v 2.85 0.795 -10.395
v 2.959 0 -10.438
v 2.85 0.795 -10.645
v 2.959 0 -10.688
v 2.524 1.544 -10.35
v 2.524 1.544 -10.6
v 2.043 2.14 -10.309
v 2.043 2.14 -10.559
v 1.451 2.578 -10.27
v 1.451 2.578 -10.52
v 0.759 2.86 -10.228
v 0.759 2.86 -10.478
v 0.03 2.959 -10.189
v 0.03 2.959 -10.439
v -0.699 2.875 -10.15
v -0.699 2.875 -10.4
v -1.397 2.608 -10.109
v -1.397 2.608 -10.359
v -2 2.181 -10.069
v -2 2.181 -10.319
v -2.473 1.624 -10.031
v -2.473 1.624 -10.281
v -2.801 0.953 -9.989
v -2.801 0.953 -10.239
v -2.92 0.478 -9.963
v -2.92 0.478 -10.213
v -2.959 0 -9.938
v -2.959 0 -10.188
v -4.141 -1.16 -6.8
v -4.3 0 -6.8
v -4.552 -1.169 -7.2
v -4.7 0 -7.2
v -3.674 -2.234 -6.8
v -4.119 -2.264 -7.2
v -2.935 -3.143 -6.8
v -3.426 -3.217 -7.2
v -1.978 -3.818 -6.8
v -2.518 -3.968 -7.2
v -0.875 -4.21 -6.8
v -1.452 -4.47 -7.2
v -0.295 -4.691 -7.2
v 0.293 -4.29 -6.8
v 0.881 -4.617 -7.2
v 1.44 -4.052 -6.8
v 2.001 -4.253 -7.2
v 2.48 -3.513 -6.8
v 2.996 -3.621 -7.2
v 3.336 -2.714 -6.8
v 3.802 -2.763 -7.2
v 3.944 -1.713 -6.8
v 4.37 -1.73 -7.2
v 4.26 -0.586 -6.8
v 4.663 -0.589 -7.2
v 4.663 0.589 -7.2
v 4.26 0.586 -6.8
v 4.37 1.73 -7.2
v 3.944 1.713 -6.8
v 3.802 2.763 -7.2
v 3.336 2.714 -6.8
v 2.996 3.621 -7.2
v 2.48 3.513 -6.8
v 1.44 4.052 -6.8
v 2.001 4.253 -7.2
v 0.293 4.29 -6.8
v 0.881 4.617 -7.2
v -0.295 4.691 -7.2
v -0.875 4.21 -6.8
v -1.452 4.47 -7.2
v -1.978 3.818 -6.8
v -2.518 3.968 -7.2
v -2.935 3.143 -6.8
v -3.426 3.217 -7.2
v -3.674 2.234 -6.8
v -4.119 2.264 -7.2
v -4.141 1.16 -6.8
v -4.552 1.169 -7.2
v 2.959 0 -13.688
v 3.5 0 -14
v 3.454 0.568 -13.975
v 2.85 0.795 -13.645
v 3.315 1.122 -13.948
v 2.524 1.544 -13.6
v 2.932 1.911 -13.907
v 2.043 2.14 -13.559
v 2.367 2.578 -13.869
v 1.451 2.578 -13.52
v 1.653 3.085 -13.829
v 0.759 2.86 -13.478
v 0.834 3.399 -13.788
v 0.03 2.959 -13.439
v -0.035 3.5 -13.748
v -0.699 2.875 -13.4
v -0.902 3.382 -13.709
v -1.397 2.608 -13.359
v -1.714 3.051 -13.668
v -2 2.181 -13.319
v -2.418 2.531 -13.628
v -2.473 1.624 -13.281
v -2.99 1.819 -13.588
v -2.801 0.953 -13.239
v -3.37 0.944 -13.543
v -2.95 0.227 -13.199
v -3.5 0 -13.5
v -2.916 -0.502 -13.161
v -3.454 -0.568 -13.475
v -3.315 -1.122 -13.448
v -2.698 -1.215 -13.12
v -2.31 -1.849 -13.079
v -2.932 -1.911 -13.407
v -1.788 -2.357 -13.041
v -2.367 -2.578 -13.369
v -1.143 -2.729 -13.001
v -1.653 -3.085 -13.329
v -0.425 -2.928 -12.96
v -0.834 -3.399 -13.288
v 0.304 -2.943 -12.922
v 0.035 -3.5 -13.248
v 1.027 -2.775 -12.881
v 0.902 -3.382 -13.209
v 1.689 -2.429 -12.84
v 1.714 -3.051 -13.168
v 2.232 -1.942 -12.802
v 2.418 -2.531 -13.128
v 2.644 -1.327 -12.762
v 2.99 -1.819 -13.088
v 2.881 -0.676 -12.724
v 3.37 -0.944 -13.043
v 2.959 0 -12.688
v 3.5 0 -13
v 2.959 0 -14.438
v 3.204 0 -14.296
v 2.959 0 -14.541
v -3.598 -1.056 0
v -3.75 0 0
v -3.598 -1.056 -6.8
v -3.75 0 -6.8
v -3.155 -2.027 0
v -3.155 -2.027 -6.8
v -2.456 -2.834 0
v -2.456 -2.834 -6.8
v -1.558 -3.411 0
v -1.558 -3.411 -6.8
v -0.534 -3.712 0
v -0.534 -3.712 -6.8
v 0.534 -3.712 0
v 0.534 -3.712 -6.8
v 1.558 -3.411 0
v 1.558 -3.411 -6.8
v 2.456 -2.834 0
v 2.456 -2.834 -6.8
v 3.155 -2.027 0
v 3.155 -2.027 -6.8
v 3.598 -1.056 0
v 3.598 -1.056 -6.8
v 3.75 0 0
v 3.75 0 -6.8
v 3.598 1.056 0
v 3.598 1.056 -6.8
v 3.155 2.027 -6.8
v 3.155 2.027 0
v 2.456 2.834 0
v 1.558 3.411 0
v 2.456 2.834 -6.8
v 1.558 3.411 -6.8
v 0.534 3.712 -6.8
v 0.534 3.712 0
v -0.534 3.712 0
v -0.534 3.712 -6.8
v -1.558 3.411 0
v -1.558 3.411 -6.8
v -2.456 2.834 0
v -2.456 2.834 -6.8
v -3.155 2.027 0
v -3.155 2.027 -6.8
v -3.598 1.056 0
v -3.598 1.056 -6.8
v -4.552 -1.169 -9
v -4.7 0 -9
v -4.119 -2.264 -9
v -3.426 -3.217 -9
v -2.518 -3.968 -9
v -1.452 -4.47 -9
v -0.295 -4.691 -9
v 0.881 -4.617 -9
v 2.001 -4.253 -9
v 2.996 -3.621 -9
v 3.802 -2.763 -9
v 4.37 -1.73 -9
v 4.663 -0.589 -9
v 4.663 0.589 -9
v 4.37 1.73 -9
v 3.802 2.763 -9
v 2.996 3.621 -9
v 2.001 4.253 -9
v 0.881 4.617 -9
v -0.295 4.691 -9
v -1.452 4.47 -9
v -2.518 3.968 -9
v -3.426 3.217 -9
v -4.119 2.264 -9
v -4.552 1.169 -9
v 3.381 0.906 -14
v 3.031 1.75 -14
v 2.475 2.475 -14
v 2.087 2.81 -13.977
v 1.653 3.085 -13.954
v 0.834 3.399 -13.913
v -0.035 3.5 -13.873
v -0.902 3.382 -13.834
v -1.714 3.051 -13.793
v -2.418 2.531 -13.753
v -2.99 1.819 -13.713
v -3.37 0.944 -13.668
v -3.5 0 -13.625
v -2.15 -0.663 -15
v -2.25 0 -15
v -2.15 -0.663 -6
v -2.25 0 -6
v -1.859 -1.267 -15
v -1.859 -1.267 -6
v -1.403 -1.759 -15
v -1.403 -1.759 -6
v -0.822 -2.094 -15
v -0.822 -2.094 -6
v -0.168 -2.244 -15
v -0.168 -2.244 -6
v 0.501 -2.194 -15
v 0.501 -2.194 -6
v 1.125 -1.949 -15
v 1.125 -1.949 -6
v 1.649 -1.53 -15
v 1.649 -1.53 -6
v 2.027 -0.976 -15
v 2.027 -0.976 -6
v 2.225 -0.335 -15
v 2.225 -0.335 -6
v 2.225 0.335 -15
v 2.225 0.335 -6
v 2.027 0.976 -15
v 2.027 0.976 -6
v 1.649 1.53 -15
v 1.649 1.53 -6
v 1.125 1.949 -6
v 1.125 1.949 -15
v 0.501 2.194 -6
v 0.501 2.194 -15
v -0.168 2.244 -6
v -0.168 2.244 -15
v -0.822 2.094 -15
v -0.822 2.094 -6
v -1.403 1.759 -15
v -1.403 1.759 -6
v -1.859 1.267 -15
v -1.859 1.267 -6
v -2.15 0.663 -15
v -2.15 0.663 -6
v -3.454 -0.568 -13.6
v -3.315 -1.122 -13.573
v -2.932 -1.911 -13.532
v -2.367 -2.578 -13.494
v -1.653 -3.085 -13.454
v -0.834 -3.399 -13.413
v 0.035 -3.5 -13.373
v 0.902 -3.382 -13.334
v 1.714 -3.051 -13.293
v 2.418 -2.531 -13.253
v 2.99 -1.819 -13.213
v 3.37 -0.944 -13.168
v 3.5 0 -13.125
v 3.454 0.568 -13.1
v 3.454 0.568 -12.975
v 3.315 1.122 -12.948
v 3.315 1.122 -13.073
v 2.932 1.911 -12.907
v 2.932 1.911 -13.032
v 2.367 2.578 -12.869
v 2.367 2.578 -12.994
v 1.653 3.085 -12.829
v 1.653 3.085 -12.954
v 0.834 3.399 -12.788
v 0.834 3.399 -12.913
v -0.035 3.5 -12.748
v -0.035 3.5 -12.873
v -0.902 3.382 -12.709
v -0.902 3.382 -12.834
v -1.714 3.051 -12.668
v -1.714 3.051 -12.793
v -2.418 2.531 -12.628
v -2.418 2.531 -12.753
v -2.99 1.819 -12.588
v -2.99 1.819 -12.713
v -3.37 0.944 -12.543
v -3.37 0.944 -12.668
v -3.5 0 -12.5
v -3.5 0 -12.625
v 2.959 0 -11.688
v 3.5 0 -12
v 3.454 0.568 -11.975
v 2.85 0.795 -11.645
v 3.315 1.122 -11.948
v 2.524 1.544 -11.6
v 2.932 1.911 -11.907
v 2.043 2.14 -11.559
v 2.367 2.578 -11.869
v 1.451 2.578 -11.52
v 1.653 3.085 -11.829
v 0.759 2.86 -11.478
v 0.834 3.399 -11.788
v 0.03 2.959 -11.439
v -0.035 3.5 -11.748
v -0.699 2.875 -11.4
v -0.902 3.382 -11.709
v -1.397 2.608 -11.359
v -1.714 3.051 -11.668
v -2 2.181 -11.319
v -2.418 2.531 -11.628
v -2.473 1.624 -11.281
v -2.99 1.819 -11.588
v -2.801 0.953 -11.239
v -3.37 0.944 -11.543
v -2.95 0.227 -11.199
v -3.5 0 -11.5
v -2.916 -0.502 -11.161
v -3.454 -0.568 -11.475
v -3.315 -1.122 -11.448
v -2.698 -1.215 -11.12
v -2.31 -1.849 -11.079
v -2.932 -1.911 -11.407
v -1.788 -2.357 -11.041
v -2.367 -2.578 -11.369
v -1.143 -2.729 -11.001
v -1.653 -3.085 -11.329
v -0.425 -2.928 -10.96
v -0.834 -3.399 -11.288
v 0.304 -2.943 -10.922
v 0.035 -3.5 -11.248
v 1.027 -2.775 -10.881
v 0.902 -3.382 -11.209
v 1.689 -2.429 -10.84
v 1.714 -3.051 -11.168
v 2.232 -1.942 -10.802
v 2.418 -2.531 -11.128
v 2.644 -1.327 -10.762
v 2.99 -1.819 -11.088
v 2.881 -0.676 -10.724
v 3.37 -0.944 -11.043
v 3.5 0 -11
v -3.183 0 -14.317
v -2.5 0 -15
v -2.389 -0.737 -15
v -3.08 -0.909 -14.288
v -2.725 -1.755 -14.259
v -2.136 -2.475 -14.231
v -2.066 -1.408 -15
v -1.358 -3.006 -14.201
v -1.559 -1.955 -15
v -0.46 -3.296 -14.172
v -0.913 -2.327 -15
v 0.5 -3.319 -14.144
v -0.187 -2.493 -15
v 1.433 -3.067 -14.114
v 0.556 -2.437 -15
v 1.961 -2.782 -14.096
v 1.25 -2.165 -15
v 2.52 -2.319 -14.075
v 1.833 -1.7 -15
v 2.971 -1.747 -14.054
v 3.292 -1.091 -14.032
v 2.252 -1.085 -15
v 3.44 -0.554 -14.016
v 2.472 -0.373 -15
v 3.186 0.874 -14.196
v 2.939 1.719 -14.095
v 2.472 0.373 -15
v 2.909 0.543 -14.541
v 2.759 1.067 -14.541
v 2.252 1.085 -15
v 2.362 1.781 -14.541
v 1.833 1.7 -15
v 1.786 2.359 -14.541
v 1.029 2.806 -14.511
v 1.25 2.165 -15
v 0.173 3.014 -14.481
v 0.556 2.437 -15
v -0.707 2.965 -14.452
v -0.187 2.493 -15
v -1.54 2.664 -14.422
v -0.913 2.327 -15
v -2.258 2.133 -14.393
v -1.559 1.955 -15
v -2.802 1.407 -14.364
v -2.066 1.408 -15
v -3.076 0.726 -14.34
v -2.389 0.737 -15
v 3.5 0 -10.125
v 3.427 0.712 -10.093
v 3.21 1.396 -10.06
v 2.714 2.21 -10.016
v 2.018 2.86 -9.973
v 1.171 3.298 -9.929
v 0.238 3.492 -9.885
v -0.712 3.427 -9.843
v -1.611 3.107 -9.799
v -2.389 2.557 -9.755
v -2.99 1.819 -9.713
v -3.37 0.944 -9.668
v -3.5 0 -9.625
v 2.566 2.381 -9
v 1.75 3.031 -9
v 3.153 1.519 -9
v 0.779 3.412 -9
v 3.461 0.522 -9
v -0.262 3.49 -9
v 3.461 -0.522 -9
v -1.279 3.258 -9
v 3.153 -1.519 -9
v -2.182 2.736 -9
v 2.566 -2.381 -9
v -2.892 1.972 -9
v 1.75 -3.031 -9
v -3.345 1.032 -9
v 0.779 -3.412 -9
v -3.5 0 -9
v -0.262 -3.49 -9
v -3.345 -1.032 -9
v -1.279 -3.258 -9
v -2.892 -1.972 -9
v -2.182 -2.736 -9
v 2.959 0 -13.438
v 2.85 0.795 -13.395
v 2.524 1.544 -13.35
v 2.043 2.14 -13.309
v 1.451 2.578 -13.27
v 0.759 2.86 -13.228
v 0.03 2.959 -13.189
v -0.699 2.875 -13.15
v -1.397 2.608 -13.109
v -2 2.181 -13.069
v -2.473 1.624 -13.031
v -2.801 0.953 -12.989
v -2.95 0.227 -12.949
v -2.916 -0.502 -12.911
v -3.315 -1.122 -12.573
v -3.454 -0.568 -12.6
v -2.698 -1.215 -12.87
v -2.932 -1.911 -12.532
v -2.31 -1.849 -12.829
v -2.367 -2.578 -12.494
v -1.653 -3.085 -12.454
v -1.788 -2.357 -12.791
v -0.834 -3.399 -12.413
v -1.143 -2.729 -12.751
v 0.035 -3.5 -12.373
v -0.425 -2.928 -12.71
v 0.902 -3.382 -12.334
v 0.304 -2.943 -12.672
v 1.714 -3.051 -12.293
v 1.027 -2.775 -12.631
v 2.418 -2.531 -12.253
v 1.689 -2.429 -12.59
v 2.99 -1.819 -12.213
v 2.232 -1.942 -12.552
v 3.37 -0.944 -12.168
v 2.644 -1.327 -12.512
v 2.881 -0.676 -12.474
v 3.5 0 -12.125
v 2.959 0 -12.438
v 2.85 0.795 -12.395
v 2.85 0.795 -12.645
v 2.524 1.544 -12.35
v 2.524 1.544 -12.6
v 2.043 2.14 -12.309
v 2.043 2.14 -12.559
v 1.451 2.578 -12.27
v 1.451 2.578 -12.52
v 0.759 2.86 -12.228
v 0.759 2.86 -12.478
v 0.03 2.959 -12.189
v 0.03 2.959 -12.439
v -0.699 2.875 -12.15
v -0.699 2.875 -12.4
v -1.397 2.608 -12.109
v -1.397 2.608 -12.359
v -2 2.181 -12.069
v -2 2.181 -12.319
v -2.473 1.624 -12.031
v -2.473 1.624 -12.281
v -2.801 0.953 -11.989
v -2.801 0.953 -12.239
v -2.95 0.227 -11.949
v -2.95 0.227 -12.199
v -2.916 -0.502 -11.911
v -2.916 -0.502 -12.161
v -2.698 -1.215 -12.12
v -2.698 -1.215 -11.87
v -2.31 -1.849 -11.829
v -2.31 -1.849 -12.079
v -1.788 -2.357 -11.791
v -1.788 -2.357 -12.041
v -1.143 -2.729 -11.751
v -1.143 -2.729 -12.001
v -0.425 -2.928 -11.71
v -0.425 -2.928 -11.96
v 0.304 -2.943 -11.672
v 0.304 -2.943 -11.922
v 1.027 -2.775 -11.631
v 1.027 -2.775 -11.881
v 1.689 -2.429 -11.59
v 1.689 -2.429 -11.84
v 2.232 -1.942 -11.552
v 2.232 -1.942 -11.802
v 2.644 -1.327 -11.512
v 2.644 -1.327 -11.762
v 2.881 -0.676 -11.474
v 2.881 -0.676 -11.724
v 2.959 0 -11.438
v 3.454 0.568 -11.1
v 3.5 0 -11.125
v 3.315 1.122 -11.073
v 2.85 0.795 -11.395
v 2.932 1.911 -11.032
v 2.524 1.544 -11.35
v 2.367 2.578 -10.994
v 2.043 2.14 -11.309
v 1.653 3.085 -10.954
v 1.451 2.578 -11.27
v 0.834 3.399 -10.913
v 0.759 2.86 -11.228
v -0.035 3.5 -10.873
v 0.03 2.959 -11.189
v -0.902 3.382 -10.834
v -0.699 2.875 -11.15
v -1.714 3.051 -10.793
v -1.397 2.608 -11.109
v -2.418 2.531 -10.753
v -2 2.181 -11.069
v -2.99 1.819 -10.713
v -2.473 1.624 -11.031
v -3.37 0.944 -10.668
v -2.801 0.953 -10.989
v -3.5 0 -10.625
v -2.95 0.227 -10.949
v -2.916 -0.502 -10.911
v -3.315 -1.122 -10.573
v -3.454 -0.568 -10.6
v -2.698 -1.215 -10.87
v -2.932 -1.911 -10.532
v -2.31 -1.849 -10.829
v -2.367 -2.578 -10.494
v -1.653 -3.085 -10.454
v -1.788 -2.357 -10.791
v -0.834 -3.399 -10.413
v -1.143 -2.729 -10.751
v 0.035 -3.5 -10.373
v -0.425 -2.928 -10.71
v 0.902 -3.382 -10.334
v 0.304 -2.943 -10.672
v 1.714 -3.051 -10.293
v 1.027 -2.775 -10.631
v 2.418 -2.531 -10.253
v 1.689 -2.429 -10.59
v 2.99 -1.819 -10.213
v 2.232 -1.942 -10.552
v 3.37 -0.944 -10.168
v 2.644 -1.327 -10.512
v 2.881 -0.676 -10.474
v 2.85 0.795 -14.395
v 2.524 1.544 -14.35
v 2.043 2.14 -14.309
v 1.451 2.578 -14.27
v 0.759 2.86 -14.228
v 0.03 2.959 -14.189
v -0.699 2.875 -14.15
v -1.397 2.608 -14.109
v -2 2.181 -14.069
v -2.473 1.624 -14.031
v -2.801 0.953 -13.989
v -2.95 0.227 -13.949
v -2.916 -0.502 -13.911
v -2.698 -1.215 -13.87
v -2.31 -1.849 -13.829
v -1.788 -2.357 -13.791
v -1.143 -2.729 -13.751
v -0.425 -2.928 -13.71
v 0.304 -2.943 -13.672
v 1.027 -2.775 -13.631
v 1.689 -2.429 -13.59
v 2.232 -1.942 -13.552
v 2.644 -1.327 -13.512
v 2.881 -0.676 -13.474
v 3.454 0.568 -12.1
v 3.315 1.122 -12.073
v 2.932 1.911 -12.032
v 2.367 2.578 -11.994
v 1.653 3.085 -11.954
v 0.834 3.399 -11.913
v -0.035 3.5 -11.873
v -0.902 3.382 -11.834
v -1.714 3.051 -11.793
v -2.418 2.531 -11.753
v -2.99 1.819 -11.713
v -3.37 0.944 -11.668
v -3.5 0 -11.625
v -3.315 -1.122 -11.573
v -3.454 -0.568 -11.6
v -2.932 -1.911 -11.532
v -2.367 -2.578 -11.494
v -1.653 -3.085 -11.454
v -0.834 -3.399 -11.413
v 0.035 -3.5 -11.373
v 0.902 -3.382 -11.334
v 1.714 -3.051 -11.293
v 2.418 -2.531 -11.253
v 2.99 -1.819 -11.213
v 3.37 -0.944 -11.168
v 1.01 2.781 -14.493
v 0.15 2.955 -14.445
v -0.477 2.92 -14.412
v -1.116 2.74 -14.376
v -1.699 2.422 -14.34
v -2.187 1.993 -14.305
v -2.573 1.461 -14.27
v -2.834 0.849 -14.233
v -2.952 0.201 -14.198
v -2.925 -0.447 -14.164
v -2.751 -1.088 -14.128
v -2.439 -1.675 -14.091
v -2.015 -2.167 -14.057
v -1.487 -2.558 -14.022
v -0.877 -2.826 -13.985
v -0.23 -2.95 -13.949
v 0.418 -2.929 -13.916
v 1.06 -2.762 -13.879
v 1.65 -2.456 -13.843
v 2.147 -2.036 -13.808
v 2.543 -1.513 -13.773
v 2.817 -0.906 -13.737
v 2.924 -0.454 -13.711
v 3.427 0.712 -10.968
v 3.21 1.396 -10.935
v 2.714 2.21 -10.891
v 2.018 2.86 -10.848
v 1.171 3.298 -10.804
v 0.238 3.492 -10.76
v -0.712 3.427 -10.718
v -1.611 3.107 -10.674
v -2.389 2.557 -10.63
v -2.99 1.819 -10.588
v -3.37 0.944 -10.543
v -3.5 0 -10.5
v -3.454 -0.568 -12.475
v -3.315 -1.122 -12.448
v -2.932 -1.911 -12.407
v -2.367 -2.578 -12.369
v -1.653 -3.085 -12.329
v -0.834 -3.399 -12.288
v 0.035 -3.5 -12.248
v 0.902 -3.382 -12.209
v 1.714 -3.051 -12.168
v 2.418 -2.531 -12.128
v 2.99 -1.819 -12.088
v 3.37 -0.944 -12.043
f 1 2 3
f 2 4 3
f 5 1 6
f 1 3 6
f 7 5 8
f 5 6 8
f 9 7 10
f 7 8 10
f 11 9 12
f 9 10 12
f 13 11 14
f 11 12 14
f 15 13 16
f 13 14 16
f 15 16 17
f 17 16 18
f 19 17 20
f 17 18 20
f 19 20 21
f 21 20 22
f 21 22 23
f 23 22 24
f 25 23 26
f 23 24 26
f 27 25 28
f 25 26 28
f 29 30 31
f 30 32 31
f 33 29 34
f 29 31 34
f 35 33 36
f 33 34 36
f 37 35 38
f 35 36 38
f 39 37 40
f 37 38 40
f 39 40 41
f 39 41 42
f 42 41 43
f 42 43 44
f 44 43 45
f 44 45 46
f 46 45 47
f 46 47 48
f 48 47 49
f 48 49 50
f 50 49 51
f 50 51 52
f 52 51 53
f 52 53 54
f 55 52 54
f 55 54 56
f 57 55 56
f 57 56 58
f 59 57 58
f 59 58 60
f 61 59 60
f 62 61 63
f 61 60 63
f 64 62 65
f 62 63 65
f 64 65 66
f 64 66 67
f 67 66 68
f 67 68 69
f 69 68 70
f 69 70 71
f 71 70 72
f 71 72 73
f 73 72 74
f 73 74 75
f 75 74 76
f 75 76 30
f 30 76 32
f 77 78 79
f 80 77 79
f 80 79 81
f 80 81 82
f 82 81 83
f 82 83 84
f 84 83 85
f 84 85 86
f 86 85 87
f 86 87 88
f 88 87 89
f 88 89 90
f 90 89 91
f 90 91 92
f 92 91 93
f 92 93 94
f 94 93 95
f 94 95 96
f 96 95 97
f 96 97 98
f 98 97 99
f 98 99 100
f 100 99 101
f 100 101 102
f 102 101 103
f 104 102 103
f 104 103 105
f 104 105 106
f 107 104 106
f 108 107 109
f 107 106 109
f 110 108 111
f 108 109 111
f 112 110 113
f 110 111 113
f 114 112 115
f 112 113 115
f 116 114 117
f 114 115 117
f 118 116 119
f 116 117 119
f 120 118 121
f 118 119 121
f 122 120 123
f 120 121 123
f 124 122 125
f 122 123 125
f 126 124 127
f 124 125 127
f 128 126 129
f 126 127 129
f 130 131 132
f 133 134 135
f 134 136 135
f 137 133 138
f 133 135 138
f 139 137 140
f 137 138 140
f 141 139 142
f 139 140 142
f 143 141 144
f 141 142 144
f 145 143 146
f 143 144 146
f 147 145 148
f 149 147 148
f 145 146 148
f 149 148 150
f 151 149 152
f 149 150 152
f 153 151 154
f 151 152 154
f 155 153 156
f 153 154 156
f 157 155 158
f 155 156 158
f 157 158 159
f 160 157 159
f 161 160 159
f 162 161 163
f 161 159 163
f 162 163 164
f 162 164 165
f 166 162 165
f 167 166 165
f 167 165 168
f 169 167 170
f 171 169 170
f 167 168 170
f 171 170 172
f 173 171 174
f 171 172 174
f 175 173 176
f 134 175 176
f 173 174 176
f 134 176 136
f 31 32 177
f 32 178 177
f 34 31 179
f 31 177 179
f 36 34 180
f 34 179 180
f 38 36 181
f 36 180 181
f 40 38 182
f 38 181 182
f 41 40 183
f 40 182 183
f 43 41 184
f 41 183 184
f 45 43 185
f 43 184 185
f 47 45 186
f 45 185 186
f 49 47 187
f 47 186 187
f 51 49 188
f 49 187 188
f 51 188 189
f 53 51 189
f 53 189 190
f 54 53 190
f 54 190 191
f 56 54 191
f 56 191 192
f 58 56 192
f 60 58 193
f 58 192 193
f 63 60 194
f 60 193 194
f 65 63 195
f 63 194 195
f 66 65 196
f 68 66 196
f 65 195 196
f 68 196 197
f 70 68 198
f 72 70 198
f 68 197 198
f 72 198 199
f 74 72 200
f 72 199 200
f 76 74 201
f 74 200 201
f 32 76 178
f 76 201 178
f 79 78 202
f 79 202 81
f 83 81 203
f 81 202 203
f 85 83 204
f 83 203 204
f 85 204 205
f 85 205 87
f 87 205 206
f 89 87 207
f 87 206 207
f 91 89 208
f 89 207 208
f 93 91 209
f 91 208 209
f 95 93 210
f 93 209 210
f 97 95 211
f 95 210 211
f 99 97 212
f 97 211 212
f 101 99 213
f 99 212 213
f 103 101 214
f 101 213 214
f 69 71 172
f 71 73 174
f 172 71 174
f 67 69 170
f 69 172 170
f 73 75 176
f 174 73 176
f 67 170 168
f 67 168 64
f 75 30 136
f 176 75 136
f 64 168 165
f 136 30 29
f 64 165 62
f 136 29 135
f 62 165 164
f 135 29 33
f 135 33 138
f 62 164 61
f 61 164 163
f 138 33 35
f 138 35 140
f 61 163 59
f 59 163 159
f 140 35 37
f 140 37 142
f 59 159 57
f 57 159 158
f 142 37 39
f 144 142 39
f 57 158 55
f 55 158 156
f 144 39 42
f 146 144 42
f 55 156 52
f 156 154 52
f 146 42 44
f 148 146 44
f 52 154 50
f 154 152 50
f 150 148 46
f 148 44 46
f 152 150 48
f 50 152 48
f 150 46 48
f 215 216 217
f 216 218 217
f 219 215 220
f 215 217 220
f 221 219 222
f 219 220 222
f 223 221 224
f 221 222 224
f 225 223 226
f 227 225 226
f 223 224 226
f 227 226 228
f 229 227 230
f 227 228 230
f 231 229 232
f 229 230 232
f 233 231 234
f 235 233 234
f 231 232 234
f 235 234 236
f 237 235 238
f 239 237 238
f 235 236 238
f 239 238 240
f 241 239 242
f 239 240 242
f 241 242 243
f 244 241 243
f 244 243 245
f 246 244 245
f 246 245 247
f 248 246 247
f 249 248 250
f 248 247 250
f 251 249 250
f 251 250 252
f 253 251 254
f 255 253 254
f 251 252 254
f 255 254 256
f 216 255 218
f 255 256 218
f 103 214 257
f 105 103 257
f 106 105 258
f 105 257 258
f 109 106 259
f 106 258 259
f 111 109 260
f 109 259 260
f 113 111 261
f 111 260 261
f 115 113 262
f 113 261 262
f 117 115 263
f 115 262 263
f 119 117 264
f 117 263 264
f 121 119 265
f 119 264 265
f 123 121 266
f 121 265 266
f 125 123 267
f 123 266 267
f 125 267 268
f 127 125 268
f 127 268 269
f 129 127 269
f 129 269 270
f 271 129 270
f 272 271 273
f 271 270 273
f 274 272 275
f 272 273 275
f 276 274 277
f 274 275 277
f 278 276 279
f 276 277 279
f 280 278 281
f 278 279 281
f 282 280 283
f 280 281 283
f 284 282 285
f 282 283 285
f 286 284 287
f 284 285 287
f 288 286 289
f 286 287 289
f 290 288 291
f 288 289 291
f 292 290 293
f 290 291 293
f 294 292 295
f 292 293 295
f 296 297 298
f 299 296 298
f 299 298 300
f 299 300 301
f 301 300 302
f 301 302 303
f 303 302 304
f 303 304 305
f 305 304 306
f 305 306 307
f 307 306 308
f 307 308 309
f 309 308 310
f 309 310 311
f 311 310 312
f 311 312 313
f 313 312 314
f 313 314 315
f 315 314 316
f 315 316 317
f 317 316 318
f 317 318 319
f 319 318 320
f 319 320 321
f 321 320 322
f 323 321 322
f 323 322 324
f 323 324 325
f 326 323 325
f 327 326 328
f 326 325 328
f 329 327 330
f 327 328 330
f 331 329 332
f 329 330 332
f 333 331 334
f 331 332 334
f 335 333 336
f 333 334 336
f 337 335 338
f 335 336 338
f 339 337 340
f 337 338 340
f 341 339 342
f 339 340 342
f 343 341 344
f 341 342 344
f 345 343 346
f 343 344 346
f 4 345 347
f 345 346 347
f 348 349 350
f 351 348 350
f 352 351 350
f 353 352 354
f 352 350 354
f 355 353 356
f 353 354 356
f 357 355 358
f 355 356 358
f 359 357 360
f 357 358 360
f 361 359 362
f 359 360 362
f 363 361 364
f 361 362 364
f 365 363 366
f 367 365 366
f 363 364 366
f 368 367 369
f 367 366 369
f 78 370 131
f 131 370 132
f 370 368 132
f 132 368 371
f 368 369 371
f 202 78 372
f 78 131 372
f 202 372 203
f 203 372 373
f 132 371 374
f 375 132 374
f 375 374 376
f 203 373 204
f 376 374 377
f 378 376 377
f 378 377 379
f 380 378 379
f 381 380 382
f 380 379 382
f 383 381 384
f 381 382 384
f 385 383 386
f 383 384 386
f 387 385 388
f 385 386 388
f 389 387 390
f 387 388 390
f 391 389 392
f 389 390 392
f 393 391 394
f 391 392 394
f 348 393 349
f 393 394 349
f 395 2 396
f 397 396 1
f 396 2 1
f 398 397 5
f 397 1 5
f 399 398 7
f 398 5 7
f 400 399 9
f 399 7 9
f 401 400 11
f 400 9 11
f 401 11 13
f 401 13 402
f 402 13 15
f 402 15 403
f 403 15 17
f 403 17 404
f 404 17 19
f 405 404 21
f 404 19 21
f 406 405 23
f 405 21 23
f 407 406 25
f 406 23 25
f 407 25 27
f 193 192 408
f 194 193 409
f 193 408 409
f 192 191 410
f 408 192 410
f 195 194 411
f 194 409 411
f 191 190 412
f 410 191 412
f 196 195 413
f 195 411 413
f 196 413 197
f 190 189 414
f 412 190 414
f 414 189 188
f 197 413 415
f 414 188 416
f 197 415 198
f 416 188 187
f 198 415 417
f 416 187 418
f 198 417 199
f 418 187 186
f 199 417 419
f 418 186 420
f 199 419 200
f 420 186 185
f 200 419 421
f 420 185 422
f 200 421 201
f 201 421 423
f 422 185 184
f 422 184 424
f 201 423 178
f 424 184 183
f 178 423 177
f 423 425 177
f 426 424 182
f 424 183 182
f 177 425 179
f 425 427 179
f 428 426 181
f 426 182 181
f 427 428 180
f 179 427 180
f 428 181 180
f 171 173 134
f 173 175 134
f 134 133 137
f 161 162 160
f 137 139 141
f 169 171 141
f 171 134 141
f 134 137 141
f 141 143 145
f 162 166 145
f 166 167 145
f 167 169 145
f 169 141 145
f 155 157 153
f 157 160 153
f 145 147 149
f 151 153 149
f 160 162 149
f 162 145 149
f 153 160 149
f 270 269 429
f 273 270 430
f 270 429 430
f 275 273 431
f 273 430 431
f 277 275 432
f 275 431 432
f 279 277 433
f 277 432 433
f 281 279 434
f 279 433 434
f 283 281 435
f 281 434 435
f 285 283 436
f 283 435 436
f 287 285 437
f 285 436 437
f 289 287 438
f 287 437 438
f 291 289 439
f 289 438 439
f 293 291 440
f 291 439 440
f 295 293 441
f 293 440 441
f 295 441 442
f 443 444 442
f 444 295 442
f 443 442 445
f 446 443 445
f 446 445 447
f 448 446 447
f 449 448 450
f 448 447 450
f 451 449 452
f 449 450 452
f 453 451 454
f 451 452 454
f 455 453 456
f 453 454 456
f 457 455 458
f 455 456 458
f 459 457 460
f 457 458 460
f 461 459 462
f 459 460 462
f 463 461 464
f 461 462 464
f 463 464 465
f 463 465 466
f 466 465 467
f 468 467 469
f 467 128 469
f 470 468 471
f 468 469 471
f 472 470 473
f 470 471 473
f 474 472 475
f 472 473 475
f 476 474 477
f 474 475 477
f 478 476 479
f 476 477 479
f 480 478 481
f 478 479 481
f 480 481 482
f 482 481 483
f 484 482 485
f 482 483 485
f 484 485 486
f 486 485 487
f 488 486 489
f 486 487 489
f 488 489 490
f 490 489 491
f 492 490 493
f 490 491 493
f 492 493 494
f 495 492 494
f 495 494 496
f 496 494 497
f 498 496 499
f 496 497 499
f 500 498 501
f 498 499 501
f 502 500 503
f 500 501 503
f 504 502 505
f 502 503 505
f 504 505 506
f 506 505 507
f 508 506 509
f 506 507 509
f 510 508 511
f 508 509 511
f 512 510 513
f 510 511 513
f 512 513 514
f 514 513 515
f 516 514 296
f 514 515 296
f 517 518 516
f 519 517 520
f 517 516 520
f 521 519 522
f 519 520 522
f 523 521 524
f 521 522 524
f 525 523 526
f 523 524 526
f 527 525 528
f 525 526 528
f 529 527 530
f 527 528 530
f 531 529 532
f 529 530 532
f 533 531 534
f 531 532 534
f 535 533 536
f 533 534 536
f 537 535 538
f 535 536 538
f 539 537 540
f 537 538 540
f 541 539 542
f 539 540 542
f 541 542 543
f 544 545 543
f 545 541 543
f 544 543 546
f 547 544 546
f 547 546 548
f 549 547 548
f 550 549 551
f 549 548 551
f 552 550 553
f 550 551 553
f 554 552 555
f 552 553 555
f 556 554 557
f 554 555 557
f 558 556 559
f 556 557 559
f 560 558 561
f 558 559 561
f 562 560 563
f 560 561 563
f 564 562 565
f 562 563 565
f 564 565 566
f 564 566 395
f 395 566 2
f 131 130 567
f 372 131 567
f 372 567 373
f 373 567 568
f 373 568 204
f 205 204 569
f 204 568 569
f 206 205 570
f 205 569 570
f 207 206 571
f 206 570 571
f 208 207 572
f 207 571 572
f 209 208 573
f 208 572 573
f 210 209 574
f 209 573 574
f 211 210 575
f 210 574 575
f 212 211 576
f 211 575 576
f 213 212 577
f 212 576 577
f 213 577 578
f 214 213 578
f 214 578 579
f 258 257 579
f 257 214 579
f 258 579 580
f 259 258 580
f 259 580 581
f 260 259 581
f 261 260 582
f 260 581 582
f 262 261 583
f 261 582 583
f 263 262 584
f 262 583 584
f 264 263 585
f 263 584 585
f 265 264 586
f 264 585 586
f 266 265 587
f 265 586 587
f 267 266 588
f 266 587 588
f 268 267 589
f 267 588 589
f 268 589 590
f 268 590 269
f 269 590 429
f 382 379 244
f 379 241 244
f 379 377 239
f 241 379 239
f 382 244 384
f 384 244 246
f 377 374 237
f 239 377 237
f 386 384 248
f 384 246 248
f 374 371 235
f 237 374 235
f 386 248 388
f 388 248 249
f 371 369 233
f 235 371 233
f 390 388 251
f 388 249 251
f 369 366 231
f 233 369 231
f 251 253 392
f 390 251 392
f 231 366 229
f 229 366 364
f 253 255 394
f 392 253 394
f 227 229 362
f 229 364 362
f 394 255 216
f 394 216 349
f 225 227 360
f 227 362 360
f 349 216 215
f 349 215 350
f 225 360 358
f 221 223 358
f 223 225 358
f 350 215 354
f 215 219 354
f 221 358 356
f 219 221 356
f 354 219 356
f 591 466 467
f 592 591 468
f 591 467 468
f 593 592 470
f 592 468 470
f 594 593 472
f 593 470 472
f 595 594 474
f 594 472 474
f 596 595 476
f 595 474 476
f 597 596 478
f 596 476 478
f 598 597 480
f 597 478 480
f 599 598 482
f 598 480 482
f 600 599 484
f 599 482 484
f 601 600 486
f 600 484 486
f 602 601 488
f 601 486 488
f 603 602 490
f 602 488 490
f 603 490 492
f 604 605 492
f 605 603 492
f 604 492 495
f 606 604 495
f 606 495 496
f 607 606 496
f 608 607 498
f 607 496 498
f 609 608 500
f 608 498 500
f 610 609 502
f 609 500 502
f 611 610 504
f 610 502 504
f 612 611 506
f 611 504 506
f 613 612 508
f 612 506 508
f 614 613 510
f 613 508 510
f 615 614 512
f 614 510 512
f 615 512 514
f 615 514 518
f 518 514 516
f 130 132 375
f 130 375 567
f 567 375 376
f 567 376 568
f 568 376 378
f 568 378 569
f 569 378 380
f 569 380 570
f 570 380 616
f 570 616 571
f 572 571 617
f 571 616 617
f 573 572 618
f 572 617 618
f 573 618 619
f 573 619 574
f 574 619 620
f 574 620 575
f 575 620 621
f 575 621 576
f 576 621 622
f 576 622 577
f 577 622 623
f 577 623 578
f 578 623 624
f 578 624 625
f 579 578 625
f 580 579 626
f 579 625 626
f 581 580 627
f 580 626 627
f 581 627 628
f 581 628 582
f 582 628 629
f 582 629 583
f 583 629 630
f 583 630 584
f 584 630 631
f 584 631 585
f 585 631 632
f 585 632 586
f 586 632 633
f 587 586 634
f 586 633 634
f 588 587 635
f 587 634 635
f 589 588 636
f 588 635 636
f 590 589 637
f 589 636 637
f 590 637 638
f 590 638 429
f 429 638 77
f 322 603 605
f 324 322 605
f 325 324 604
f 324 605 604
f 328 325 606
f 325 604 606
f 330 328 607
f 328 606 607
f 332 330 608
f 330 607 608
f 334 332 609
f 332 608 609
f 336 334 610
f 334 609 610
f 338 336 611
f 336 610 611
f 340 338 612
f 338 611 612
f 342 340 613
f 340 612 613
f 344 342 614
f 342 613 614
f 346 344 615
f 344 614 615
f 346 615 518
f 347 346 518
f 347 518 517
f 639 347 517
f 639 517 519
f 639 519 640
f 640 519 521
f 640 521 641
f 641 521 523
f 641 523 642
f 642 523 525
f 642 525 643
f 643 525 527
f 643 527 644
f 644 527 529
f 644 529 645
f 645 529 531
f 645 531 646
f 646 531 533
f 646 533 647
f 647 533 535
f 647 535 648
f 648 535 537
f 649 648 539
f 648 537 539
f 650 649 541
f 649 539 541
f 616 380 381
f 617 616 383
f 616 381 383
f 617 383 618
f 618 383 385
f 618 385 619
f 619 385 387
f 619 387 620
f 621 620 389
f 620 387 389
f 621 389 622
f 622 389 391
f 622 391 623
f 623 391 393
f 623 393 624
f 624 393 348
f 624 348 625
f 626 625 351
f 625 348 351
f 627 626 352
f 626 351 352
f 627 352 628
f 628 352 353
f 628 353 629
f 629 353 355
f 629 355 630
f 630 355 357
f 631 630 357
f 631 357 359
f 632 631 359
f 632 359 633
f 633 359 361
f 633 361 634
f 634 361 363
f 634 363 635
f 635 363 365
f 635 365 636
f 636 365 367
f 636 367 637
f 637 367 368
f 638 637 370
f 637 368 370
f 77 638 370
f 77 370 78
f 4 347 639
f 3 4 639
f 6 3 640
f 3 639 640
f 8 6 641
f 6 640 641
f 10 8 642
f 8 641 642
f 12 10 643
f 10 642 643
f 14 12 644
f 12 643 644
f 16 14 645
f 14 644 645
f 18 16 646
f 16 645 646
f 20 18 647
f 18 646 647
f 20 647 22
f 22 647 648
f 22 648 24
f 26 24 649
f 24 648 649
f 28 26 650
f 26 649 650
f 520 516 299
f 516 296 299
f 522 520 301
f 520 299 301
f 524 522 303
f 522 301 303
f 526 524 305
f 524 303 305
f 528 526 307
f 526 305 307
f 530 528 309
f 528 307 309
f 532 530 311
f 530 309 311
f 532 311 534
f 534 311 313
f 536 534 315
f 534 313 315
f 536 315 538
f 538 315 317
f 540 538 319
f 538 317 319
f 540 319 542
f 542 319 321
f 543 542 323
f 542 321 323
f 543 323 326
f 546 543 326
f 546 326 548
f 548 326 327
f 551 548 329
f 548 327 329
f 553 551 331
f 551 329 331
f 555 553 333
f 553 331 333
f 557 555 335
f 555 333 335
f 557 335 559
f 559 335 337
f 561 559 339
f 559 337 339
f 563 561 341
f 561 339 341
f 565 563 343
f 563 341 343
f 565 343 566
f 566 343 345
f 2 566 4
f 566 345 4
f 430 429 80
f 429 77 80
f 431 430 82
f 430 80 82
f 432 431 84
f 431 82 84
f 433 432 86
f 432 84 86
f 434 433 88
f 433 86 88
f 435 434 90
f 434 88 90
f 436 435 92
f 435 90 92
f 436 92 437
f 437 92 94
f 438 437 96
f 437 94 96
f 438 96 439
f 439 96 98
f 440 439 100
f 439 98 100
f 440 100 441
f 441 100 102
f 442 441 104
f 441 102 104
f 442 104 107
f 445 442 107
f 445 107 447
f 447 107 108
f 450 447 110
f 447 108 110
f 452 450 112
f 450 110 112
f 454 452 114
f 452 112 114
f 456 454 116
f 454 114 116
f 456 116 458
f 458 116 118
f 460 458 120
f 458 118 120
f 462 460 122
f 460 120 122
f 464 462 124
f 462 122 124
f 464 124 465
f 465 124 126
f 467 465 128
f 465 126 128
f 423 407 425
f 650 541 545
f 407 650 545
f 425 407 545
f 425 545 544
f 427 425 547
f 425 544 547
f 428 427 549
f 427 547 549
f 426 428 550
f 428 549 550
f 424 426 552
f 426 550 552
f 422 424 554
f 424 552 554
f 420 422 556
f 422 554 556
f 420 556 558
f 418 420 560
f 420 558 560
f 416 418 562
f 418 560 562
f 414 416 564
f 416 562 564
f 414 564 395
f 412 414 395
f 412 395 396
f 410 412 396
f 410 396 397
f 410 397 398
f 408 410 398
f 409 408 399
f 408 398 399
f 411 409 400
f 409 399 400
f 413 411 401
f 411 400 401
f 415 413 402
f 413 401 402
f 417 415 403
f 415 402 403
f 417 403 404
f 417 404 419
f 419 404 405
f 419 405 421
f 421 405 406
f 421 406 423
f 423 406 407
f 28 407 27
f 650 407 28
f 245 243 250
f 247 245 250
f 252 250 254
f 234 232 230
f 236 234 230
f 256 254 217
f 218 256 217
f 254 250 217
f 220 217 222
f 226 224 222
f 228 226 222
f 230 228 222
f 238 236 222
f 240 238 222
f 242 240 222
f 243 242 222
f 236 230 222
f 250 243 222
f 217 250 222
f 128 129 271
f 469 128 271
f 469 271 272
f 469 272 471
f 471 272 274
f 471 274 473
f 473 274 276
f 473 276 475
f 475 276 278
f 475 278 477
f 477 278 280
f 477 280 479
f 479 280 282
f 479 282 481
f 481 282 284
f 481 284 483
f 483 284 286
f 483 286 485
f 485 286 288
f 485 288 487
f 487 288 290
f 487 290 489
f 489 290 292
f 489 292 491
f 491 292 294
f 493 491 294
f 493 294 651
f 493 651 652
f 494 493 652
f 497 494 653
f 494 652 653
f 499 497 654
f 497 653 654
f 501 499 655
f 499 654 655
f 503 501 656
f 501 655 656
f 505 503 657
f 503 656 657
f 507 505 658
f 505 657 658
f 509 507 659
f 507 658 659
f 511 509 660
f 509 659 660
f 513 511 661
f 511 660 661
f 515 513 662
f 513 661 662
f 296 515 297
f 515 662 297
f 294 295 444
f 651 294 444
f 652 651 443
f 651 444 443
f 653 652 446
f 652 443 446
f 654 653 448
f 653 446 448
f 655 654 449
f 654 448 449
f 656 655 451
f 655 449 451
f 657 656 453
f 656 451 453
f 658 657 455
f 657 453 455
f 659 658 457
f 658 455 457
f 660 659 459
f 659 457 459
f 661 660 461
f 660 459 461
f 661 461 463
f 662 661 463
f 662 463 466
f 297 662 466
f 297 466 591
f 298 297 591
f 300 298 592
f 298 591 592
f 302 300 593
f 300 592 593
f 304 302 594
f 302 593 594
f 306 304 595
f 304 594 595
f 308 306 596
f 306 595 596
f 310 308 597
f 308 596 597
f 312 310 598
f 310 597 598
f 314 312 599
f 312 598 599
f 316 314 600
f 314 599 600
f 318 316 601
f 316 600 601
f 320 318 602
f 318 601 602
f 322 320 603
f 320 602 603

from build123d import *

# Parameters (mm, degrees)
CHAMFER1_SIZE = 1
THREAD1_PITCH = 1


with BuildPart() as part:
    # Sketch2 → Revolve1 (revolve)
    with BuildSketch(Plane(origin=(0, 0, 0), x_dir=(1, 0, 0), z_dir=(0, 1, 0)), mode=Mode.PRIVATE) as revolve1_sk:
        Polygon((0, 0), (3.75, 0), (3.75, 6.8), (4.3, 6.8), (4.7, 7.2), (4.7, 9), (3.5, 9), (3.5, 15), (2.25, 15), (2.25, 6), (0, 6), align=None)
    revolve(revolve1_sk.sketch.rotate(Axis((0, 0, -6), (0, 0, 1)), 180), axis=Axis((0, 0, -6), (0, 0, 1)))

    # Chamfer1
    chamfer1_edges = [part.edges().sort_by_distance(p)[0] for p in [
        (3.5, 0, -15),
    ]]
    chamfer(chamfer1_edges, length=CHAMFER1_SIZE)

    # Thread1: the profile of Thread Profile1 profile screwed along a right-hand helix of 4.5 turns, 8 arcs to a turn; built about Z, then put on its axis
    thread1_z = Axis((0, 0, 0), (0, 0, 1))
    thread1_corners = [(3.5003, 0, -0.000173205), (3.5003, 0, 0.875173202), (2.958734125, 0, 0.562499999), (2.958734125, 0, 0.312499999)]
    with BuildLine(mode=Mode.PRIVATE) as thread1_profile:
        Line(thread1_corners[0], thread1_corners[1])
        Line(thread1_corners[1], thread1_corners[2])
        Line(thread1_corners[2], thread1_corners[3])
        Line(thread1_corners[3], thread1_corners[0])
    thread1_cap = Face(thread1_profile.wire())
    thread1_turn_angles = [0, 22.5, 45, 67.5, 90, 112.5, 135, 157.5, 180, 202.5, 225, 247.5, 270, 292.5, 315, 337.5, 360]
    thread1_turn_weights = [1, 0.9238795325112867, 1, 0.9238795325112867, 1, 0.9238795325112867, 1, 0.9238795325112867, 1, 0.9238795325112867, 1, 0.9238795325112867, 1, 0.9238795325112867, 1, 0.9238795325112867, 1]
    thread1_turn_rails = [Edge.make_bspline([Vector(p[0], p[1], 0).rotate(thread1_z, thread1_turn_angles[k]) / thread1_turn_weights[k] + Vector(0, 0, p[2] + THREAD1_PITCH * thread1_turn_angles[k] / 360) for k in range(17)], [0, 0, 0, 1, 1, 2, 2, 3, 3, 4, 4, 5, 5, 6, 6, 7, 7, 8, 8, 8], 2, thread1_turn_weights) for p in thread1_corners]
    thread1_turn_sides = [Face.make_surface_from_curves(thread1_turn_rails[p[0]], thread1_turn_rails[p[1]]) for p in [(0, 1), (1, 2), (2, 3), (3, 0)]]
    thread1_last_angles = [1440, 1462.5, 1485, 1507.5, 1530, 1552.5, 1575, 1597.5, 1620]
    thread1_last_weights = [1, 0.9238795325112867, 1, 0.9238795325112867, 1, 0.9238795325112867, 1, 0.9238795325112966, 1]
    thread1_last_rails = [Edge.make_bspline([Vector(p[0], p[1], 0).rotate(thread1_z, thread1_last_angles[k]) / thread1_last_weights[k] + Vector(0, 0, p[2] + THREAD1_PITCH * thread1_last_angles[k] / 360) for k in range(9)], [0, 0, 0, 1, 1, 2, 2, 3, 3, 4, 4, 4], 2, thread1_last_weights) for p in thread1_corners]
    thread1_last_sides = [Face.make_surface_from_curves(thread1_last_rails[p[0]], thread1_last_rails[p[1]]) for p in [(0, 1), (1, 2), (2, 3), (3, 0)]]
    thread1 = Plane(origin=(0, 0, -15), x_dir=(1, 0, 0), z_dir=(0, 0, 1)) * Solid(Shell([*[p.moved(Location((0, 0, THREAD1_PITCH * i))) for i in range(4) for p in thread1_turn_sides], *thread1_last_sides, thread1_cap, thread1_cap.rotate(thread1_z, 1620).moved(Location((0, 0, THREAD1_PITCH * 1620 / 360)))]))
    add(thread1, mode=Mode.SUBTRACT)


solid = part.part
